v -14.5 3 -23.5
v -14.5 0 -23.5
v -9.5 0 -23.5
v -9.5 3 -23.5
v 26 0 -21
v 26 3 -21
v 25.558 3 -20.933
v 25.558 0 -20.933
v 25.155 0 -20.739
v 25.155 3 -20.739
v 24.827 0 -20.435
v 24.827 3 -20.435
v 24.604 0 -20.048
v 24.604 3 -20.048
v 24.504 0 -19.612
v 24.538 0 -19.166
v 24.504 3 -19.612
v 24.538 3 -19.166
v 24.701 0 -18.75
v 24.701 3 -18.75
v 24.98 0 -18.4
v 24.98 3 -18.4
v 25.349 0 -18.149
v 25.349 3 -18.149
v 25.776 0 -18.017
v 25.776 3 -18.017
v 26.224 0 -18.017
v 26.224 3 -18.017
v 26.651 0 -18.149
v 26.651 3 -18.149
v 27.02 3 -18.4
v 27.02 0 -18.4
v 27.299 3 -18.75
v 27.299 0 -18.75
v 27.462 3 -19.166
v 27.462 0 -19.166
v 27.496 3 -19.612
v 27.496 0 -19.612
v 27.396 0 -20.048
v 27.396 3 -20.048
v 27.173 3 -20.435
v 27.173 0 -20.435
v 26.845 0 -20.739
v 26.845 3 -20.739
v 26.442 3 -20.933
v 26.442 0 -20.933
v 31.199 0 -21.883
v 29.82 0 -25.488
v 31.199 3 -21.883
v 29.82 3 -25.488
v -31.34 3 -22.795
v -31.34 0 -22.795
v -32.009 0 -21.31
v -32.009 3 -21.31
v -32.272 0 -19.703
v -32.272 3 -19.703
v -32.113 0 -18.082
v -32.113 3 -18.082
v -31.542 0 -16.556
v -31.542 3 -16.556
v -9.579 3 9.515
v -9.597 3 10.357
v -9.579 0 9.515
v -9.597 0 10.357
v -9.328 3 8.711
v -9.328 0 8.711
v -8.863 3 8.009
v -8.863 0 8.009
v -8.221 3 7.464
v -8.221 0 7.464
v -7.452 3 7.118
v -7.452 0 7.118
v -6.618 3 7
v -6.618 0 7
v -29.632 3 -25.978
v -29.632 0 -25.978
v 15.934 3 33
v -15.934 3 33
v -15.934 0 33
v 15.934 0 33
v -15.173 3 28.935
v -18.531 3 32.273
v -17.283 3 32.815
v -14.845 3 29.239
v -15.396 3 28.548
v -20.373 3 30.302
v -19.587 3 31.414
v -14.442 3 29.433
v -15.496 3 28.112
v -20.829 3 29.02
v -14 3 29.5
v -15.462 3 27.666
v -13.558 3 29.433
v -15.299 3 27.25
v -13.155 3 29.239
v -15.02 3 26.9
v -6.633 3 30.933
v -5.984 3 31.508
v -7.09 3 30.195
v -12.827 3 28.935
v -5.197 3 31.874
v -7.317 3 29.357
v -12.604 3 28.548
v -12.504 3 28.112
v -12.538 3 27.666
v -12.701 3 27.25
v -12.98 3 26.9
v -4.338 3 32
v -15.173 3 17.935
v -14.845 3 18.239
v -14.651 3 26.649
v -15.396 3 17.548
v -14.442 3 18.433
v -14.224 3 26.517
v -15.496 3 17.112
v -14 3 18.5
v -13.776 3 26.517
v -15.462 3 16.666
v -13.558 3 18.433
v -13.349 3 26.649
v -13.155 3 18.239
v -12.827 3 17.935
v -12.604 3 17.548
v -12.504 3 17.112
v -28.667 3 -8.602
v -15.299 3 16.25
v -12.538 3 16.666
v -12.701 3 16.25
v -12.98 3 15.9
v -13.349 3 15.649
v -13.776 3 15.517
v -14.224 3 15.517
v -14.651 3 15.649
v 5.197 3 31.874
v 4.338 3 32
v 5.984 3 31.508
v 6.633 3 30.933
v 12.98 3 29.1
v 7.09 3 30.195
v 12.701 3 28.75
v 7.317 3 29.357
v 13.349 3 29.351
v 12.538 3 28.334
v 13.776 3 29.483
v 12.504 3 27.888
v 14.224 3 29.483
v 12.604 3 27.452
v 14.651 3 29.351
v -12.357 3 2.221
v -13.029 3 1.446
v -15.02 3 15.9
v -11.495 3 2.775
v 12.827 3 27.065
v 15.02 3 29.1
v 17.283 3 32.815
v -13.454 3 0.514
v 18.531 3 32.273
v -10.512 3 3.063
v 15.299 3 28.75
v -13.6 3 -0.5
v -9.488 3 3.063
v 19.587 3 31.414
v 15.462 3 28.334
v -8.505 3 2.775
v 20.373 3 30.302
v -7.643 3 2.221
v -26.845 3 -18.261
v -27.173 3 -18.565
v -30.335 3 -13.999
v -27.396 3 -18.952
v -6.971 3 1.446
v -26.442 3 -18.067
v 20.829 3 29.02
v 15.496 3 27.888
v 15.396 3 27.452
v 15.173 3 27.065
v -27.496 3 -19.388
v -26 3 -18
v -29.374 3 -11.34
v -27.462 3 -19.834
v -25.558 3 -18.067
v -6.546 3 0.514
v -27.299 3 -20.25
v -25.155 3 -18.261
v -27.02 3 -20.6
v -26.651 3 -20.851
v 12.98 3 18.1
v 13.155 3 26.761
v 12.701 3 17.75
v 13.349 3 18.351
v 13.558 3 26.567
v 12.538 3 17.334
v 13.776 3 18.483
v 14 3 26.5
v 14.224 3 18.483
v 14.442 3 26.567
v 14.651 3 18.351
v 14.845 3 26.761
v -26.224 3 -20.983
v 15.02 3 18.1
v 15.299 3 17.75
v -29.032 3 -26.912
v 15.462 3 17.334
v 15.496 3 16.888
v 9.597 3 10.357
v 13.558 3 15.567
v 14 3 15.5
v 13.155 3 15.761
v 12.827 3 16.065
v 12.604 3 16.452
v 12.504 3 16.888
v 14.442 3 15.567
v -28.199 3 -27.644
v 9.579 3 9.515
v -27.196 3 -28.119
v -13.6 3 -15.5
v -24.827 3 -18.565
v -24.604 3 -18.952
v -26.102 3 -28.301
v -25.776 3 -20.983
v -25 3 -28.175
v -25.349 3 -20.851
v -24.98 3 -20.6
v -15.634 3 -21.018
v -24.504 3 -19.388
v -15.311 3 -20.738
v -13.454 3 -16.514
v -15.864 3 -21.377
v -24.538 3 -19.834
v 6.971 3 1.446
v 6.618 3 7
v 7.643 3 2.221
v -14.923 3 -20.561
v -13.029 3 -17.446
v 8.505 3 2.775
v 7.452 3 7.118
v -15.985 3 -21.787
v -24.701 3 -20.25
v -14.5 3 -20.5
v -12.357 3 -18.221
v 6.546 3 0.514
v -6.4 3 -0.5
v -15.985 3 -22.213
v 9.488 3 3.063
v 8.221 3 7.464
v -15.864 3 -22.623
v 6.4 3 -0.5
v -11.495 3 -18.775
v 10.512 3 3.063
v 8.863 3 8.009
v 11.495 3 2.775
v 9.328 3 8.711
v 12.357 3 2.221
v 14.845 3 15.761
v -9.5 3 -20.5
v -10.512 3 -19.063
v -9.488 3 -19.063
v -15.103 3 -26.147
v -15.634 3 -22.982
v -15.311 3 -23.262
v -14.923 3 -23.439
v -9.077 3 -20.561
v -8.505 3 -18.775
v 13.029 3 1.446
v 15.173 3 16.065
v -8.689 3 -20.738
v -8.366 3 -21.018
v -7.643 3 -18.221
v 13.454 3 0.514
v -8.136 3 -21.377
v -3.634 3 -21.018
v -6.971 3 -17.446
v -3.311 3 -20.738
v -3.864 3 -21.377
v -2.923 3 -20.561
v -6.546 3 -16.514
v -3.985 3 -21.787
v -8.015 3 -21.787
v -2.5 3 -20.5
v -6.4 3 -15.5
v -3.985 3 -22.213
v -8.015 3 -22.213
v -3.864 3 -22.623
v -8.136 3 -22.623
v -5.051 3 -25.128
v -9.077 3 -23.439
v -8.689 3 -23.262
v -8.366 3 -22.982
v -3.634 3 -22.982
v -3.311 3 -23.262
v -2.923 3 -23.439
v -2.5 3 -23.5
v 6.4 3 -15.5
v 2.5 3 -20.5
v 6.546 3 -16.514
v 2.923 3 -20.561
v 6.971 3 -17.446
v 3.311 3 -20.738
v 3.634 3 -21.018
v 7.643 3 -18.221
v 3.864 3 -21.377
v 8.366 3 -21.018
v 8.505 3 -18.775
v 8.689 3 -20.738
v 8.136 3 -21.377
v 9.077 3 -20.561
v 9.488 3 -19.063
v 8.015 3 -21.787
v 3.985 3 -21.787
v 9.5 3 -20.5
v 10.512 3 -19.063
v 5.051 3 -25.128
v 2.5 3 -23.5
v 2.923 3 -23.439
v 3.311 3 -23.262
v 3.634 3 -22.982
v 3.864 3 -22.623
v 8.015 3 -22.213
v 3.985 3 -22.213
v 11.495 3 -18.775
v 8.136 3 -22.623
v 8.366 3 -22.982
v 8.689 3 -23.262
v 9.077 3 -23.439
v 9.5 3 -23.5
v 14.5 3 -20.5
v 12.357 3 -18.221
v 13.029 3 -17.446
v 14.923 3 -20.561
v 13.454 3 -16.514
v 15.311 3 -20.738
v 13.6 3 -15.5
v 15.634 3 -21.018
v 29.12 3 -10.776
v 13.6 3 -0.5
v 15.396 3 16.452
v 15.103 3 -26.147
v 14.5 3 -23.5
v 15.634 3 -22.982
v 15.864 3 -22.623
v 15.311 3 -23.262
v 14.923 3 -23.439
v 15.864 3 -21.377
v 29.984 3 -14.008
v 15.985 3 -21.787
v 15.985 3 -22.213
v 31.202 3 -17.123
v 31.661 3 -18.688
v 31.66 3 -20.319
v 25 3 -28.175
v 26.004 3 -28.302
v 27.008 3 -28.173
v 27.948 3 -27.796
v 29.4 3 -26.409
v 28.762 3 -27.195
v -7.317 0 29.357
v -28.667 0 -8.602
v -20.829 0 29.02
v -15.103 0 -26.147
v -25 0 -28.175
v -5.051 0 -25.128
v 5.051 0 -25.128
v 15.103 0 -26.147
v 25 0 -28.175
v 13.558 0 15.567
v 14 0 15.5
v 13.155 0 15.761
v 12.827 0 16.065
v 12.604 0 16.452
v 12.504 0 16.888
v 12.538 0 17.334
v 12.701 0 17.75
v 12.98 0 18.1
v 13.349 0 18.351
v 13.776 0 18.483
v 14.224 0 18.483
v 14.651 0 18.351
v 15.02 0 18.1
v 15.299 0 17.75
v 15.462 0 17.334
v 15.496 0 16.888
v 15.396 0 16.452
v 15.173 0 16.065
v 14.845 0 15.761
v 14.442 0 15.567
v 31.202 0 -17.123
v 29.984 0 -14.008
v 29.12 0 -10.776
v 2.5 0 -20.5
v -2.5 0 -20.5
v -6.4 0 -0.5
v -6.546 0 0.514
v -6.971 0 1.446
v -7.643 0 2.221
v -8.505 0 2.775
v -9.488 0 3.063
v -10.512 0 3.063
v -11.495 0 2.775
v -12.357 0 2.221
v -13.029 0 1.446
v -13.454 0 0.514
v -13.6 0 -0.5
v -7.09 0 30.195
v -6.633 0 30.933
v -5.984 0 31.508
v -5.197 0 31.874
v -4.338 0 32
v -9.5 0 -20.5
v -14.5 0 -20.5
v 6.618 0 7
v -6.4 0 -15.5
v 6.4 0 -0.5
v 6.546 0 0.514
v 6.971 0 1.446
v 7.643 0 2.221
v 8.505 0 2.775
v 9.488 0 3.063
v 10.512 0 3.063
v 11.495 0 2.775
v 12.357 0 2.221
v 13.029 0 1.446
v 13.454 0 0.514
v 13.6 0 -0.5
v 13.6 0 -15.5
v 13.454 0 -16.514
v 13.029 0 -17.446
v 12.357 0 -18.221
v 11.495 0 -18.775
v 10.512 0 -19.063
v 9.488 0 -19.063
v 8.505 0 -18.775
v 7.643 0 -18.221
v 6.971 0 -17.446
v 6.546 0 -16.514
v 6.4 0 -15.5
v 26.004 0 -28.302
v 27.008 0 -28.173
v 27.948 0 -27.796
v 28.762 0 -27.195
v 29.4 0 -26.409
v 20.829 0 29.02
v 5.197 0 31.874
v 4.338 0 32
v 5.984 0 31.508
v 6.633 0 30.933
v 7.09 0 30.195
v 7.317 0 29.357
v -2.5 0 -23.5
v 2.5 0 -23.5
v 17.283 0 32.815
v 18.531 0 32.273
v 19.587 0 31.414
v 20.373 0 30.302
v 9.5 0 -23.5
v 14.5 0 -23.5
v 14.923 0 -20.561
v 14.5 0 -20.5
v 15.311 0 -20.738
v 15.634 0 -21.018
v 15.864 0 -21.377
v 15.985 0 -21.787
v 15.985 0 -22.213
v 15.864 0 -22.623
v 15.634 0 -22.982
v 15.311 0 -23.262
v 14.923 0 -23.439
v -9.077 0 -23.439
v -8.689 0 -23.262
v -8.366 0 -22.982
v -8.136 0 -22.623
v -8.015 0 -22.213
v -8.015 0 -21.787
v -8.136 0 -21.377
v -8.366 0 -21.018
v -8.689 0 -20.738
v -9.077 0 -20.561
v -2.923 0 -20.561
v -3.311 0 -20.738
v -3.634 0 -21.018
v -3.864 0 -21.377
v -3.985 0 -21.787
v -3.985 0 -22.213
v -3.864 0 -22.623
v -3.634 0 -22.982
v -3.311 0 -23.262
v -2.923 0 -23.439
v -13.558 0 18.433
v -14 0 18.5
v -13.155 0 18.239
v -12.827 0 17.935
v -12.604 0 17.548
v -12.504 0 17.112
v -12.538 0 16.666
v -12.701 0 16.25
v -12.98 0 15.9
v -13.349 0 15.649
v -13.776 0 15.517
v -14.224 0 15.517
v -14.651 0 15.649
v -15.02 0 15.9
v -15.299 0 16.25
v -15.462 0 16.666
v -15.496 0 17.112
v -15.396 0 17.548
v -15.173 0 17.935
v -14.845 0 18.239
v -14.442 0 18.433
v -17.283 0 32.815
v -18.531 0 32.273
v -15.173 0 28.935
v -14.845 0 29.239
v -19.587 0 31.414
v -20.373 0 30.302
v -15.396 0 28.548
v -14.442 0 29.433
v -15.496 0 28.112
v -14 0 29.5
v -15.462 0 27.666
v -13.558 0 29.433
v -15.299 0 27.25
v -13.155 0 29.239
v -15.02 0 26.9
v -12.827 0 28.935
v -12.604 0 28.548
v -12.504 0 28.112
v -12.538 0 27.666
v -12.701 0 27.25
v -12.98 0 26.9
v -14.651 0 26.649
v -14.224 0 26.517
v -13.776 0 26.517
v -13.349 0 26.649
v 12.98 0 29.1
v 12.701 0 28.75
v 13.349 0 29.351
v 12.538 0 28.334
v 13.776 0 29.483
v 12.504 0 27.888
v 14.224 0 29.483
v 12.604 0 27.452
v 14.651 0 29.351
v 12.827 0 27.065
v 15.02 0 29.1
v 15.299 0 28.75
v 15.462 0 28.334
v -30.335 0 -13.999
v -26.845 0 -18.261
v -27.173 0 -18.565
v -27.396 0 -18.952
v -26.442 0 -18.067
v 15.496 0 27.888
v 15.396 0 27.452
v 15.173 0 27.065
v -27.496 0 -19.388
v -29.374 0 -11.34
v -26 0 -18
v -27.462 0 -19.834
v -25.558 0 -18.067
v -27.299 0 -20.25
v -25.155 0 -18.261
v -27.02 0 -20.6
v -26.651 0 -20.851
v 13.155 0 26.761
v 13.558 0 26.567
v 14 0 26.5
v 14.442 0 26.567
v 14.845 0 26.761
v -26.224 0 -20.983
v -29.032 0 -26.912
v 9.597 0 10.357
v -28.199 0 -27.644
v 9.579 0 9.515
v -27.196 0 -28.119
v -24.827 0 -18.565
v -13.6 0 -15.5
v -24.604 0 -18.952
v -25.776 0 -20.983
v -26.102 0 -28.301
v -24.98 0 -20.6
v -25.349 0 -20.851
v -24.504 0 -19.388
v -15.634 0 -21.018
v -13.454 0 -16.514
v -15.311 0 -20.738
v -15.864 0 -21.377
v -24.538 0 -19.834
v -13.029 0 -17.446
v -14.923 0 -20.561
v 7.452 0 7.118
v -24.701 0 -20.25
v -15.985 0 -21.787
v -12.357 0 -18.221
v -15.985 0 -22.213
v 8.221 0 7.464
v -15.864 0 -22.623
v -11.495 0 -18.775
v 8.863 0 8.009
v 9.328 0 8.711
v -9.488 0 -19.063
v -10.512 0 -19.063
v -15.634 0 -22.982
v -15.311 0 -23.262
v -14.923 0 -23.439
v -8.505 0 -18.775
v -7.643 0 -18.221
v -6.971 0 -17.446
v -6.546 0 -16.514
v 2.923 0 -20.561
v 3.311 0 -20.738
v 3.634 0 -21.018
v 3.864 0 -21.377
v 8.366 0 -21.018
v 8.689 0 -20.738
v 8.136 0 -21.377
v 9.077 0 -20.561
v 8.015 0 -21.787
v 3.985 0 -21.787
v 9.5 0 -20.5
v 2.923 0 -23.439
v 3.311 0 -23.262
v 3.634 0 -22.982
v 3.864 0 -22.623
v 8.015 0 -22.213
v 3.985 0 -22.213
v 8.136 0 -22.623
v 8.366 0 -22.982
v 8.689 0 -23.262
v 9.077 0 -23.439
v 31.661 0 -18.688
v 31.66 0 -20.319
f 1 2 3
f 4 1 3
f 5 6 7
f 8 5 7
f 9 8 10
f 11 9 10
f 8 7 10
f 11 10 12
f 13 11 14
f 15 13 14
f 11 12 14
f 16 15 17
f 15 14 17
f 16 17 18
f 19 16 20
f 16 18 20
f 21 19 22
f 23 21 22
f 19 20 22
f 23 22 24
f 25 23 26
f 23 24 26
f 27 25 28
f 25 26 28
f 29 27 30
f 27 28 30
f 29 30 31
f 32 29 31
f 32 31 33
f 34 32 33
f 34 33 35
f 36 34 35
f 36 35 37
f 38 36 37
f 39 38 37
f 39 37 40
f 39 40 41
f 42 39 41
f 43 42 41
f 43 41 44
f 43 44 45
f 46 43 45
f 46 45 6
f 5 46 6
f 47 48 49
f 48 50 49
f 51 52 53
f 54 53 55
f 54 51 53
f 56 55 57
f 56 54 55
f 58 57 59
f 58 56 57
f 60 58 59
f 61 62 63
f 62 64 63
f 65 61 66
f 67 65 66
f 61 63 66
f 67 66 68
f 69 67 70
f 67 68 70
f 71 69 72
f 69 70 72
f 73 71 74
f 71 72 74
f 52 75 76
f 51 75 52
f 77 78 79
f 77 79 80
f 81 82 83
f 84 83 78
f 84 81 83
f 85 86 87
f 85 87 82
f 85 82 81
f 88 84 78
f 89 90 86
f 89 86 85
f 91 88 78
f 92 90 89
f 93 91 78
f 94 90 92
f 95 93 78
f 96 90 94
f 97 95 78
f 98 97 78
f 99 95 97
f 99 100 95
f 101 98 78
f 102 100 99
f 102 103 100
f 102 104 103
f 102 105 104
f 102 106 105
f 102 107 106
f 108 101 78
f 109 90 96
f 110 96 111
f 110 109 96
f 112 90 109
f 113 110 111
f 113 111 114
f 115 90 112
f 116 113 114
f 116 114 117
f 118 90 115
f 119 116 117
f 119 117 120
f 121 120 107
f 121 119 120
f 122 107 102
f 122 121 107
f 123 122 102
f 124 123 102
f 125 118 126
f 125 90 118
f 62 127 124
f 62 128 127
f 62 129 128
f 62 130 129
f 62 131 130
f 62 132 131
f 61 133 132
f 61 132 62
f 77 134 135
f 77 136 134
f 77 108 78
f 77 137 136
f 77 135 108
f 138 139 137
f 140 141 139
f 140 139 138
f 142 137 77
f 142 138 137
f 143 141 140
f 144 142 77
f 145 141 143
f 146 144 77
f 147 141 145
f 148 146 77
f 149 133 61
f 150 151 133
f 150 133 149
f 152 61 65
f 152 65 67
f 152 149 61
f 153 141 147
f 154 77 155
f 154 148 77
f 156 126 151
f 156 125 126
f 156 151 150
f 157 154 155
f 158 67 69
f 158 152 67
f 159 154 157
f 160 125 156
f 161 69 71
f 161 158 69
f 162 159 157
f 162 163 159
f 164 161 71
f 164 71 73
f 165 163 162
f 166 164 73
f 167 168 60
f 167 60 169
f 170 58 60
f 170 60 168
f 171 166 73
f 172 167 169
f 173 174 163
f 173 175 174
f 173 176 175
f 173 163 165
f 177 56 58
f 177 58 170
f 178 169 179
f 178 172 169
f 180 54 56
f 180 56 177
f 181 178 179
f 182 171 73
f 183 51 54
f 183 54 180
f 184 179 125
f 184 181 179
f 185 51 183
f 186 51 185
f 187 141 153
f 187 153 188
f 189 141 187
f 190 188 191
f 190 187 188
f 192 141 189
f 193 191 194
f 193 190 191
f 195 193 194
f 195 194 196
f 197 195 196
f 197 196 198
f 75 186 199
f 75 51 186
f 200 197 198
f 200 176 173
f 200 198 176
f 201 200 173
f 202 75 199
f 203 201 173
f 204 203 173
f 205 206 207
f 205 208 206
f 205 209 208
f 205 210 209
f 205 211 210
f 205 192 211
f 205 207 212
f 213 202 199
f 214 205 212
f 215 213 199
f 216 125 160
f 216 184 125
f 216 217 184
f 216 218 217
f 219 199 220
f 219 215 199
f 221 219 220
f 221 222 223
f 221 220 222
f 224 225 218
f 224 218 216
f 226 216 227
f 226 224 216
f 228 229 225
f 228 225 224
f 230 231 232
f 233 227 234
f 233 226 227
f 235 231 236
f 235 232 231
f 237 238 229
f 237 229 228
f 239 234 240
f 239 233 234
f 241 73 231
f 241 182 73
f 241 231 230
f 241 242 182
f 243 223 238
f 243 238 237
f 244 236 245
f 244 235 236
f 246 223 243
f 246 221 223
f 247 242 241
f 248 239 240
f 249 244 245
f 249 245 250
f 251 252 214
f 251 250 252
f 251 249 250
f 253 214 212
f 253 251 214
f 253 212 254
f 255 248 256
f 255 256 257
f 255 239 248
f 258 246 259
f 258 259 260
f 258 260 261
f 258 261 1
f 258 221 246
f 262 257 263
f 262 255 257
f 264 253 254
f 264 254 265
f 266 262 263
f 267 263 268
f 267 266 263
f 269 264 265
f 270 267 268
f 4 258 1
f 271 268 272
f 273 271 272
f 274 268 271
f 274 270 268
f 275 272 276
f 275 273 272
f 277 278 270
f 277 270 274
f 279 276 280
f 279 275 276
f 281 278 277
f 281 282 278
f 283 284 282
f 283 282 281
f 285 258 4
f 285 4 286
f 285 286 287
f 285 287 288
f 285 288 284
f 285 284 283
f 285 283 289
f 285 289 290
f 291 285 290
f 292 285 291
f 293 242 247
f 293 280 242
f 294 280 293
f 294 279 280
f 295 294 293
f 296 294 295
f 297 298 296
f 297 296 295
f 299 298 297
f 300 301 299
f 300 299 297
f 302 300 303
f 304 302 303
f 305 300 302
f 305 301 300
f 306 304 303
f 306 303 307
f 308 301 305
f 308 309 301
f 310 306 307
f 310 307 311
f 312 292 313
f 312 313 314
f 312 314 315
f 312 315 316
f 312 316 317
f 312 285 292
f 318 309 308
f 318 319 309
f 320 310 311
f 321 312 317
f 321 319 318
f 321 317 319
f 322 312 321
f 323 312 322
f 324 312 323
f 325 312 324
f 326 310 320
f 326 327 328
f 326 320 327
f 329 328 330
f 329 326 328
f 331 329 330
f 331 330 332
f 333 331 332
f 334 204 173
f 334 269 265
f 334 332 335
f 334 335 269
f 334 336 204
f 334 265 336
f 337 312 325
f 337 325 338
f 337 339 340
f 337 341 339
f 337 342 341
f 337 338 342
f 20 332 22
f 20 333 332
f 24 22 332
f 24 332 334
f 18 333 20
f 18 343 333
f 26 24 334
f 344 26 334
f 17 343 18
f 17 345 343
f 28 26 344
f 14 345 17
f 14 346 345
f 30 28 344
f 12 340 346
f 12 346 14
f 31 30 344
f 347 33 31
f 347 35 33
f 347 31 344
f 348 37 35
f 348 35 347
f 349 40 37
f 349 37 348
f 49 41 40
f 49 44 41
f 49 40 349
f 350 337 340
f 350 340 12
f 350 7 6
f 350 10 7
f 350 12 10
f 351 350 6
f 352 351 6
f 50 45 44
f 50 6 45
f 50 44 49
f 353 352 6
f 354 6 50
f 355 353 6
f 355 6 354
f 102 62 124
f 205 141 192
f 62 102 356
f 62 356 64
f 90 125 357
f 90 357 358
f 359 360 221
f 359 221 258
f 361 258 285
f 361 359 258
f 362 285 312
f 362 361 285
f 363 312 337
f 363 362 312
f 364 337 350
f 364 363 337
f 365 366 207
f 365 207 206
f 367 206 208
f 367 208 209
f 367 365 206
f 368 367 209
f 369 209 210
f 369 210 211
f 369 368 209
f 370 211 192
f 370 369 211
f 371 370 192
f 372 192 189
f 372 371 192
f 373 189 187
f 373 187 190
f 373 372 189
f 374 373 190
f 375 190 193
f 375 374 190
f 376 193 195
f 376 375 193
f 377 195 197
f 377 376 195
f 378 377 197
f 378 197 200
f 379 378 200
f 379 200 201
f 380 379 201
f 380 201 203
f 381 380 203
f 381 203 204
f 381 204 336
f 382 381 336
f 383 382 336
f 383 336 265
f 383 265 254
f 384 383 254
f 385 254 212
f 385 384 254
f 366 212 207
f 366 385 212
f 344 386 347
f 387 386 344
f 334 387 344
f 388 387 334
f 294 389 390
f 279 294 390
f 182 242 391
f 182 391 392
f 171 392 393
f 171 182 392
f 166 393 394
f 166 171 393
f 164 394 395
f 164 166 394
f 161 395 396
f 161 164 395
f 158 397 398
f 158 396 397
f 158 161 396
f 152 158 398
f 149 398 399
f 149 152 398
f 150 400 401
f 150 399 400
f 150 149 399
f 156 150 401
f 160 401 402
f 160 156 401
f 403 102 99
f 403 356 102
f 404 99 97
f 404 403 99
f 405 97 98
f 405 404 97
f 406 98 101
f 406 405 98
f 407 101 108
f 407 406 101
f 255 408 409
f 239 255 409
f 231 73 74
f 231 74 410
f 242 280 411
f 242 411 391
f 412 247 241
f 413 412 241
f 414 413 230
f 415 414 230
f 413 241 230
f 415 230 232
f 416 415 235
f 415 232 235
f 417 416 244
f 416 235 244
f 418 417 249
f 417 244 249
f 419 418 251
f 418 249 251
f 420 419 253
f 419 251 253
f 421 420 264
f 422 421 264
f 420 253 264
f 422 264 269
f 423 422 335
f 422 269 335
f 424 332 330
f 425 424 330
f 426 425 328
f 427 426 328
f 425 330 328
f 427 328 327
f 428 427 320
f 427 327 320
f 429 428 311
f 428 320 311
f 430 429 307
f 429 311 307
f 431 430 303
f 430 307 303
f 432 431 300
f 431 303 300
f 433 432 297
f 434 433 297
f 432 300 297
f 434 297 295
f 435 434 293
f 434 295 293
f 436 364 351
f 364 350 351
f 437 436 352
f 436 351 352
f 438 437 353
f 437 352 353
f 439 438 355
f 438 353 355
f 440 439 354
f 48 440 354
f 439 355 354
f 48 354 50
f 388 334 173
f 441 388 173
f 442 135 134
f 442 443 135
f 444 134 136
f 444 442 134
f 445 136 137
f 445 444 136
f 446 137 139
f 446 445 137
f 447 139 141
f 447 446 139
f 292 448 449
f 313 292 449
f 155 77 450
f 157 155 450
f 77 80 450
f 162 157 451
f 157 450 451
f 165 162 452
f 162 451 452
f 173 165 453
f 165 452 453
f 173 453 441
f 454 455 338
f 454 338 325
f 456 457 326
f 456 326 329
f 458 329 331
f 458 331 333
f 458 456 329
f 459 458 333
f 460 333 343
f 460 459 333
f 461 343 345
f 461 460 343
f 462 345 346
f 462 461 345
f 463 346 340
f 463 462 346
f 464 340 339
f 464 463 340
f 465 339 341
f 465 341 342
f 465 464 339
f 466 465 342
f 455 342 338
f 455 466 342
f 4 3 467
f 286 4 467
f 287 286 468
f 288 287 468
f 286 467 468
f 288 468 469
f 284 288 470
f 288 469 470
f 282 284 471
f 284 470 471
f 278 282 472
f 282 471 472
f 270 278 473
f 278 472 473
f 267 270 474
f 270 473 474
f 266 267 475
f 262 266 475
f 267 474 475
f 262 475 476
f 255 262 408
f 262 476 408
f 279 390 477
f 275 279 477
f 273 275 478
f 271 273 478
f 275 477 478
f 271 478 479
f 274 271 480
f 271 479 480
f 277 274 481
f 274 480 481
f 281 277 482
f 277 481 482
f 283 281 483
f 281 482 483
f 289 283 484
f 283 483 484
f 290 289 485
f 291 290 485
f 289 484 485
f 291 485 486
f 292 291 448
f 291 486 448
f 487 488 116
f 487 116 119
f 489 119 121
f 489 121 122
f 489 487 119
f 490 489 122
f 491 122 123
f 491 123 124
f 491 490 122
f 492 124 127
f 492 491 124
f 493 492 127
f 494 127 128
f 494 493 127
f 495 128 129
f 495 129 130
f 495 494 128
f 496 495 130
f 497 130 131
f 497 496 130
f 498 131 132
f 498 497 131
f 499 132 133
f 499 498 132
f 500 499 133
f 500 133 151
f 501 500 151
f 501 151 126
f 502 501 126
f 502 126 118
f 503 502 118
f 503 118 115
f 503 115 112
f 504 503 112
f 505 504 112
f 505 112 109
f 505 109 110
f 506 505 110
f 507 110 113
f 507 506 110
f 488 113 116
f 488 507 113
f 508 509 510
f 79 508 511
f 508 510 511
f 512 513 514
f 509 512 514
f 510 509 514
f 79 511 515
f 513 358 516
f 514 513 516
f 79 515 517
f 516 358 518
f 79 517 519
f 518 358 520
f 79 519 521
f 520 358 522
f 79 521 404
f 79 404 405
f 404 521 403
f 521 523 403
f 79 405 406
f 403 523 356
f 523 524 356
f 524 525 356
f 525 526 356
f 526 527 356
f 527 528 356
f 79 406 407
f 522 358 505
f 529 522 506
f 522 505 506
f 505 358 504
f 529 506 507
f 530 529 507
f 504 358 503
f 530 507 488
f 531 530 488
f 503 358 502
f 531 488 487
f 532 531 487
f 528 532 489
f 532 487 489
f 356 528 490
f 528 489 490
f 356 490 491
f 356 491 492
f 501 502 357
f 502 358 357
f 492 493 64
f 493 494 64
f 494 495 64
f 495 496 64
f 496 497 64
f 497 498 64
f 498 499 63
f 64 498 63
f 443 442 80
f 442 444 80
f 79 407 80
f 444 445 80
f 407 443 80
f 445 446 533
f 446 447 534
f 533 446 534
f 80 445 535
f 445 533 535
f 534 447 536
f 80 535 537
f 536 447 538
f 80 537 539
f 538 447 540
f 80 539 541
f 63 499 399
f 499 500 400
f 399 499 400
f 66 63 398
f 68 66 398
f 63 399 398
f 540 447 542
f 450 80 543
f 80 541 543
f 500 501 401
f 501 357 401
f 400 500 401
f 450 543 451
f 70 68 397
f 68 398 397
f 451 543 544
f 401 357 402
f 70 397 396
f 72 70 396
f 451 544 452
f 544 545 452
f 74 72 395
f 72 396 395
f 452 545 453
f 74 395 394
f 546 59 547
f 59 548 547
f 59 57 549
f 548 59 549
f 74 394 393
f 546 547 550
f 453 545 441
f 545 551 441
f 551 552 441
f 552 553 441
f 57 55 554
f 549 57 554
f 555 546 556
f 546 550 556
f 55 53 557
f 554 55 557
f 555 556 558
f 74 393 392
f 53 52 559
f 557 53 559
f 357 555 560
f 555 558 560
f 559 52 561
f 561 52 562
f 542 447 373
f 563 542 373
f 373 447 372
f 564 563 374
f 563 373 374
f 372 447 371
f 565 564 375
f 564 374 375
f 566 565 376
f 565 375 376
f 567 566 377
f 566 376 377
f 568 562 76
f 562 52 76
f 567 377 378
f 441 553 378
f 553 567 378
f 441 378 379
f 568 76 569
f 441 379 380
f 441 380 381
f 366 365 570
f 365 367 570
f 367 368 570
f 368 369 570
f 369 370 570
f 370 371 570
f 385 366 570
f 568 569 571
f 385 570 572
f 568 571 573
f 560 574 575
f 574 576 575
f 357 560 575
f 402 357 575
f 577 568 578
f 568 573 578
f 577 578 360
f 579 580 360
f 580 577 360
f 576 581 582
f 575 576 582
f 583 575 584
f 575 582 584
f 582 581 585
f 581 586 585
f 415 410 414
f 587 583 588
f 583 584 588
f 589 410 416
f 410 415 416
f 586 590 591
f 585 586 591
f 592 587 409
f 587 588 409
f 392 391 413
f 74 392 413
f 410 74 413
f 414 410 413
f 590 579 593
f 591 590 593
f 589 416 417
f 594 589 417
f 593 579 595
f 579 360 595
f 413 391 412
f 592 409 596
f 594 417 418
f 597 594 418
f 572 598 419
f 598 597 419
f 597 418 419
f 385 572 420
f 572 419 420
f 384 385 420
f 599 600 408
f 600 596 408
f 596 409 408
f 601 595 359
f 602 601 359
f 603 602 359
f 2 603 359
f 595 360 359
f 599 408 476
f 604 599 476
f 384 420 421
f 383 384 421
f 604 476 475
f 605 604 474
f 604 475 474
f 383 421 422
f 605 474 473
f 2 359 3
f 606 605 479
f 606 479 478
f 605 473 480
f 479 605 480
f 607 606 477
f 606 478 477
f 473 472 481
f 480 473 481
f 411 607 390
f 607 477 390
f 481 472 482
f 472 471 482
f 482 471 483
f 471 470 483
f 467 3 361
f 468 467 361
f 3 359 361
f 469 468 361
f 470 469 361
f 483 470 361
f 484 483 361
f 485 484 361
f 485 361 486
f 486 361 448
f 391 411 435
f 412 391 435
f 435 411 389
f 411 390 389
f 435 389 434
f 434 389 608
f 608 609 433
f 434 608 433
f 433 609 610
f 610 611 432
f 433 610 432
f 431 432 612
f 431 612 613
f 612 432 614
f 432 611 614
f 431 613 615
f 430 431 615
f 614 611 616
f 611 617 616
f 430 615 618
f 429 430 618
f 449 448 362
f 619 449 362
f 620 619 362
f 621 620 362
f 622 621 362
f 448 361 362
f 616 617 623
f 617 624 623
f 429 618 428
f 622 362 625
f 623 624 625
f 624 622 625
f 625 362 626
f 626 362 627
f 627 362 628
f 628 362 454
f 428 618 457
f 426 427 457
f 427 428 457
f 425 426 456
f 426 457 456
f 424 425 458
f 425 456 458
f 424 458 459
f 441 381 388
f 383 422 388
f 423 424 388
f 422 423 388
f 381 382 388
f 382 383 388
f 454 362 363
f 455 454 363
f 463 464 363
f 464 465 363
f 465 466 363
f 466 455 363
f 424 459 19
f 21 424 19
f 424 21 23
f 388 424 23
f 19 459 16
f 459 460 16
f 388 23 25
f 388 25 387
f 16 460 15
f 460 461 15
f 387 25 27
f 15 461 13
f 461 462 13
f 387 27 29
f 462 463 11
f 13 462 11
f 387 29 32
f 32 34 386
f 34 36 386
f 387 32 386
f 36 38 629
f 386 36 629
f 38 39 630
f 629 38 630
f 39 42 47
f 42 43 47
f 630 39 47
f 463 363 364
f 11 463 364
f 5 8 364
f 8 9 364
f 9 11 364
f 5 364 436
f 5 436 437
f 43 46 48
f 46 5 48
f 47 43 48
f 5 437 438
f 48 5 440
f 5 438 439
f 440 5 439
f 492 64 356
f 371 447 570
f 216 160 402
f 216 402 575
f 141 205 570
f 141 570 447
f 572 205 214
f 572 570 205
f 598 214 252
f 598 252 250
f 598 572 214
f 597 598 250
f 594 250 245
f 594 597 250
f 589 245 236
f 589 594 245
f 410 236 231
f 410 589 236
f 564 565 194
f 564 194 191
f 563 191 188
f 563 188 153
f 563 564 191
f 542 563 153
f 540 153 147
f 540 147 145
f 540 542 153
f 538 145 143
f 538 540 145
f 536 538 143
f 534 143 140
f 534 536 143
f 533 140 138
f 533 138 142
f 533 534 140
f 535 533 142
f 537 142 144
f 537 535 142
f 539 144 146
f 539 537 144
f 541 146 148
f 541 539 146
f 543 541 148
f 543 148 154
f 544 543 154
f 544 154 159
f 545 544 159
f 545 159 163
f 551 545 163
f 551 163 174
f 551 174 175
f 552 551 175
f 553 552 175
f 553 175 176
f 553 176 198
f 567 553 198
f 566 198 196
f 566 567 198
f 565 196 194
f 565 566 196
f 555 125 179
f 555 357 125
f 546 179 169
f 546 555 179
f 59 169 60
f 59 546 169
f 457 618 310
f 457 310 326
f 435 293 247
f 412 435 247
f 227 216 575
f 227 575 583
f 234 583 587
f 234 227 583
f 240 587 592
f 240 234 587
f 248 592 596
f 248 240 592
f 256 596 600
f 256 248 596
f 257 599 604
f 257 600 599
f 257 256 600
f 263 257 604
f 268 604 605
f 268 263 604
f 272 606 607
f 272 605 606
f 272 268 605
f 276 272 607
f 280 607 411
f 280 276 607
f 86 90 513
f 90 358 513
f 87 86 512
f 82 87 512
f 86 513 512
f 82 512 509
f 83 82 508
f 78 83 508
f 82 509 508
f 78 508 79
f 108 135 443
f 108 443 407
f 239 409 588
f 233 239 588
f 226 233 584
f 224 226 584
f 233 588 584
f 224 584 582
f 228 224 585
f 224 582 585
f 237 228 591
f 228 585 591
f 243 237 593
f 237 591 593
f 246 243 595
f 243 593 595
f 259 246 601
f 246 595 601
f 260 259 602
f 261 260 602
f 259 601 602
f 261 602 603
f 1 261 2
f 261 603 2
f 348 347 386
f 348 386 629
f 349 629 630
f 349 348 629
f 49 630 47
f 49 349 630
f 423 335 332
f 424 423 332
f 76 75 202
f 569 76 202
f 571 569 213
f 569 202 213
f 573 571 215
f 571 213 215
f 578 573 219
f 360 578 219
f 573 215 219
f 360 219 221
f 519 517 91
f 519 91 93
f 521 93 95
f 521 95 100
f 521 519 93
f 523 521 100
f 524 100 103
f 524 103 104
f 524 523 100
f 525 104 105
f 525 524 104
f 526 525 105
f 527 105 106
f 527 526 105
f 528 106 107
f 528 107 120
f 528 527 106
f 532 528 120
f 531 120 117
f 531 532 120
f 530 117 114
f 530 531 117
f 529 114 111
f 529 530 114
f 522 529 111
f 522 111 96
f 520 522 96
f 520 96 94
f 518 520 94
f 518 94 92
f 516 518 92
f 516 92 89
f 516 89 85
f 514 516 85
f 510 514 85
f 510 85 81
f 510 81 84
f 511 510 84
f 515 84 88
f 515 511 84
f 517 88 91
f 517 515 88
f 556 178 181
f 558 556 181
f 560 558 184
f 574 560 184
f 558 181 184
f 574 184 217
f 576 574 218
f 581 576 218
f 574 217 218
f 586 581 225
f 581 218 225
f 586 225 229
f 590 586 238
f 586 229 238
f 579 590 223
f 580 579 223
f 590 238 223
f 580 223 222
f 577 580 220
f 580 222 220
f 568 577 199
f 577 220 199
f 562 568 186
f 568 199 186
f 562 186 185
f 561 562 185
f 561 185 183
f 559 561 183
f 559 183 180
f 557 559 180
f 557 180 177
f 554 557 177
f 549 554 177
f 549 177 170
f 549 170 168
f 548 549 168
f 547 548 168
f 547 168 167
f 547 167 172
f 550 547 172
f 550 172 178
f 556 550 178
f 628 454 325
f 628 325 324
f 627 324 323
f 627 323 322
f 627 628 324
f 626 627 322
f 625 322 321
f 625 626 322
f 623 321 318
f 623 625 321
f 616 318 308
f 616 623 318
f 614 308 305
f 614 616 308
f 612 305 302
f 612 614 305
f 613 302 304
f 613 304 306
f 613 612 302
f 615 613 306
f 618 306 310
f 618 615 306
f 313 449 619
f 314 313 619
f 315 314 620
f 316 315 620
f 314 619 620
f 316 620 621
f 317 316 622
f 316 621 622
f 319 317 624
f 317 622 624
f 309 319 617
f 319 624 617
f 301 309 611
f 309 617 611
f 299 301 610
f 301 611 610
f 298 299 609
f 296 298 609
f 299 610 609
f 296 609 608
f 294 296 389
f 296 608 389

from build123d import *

# Parameters (mm, degrees)
SKETCH_1_R          = 1.5
EXTRUDE_1_DEPTH     = 3
SKETCH_2_R          = 1.5
CUT_EXTRUDE_1_DEPTH = 55.166410256
EXTRUDE_2_DEPTH     = 3
CUT_EXTRUDE_2_DEPTH = 55.166410256
CUT_EXTRUDE_3_DEPTH = 3
FILLET_1_R          = 3
EXTRUDE_3_DEPTH     = 3
FILLET_3_R          = 4
SKETCH_9_W          = 40
SKETCH_9_H          = 28
CUT_EXTRUDE_4_DEPTH = 10
FILLET_4_R          = 5
SKETCH_11_R         = 6.275308726
SKETCH_11_R_2       = 1.5
SKETCH_11_R_3       = 5.719245844
EXTRUDE_4_DEPTH     = 3
FILLET_5_R          = 30


with BuildPart() as part:
    # 草图1 → 凸台-拉伸1 (new body)
    with BuildSketch(Plane(origin=(0, 0, 0), x_dir=(1, 0, 0), z_dir=(0, 1, 0))):
        with BuildLine():
            Line((-17.5, -25), (-30, -25))
            Line((-30, -25), (-30, 25))
            Line((-30, 25), (-30, 29.606079858))
            ThreePointArc((-30, 29.606079858), (0, 25), (30, 29.606079858))
            Line((30, 29.606079858), (30, 25))
            Line((30, 25), (30, -25))
            Line((30, -25), (17.5, -25))
            Line((17.5, -25), (17.5, -45))
            Line((17.5, -45), (-17.5, -45))
            Line((-17.5, -45), (-17.5, -25))
        make_face()
        with Locations(Location((-14, -17, 0), (0, 0, 270))):
            Circle(SKETCH_1_R, mode=Mode.SUBTRACT)
        with Locations(Location((14, -17, 0), (0, 0, 90))):
            Circle(SKETCH_1_R, mode=Mode.SUBTRACT)
        with Locations(Location((-14, -28, 0), (0, 0, 270))):
            Circle(SKETCH_1_R, mode=Mode.SUBTRACT)
        with Locations(Location((14, -28, 0), (0, 0, 90))):
            Circle(SKETCH_1_R, mode=Mode.SUBTRACT)
        with BuildLine():
            Line((9.5, 20.5), (14.5, 20.5))
            ThreePointArc((14.5, 20.5), (16, 22), (14.5, 23.5))
            Line((14.5, 23.5), (9.5, 23.5))
            ThreePointArc((9.5, 23.5), (8, 22), (9.5, 20.5))
        make_face(mode=Mode.SUBTRACT)
        with BuildLine():
            Line((-2.5, 23.5), (2.5, 23.5))
            ThreePointArc((2.5, 23.5), (4, 22), (2.5, 20.5))
            Line((2.5, 20.5), (-2.5, 20.5))
            ThreePointArc((-2.5, 20.5), (-4, 22), (-2.5, 23.5))
        make_face(mode=Mode.SUBTRACT)
        with BuildLine():
            Line((-14.5, 23.5), (-9.5, 23.5))
            ThreePointArc((-9.5, 23.5), (-8, 22), (-9.5, 20.5))
            Line((-9.5, 20.5), (-14.5, 20.5))
            ThreePointArc((-14.5, 20.5), (-16, 22), (-14.5, 23.5))
        make_face(mode=Mode.SUBTRACT)
    extrude(amount=EXTRUDE_1_DEPTH)

    # 草图2 → 切除-拉伸1 (cut, through all)
    with BuildSketch(Plane(origin=(0, 3, 0), x_dir=(1, 0, 0), z_dir=(0, 1, 0))):
        with Locations(Location((-26, 19.5, 0), (0, 0, 270))):
            Circle(SKETCH_2_R)
        with Locations(Location((26, 19.5, 0), (0, 0, 90))):
            Circle(SKETCH_2_R)
        with BuildLine():
            Line((-6.4, 15.5), (-6.4, 0.5))
            ThreePointArc((-6.4, 0.5), (-10, -3.1), (-13.6, 0.5))
            Line((-13.6, 0.5), (-13.6, 15.5))
            ThreePointArc((-13.6, 15.5), (-10, 19.1), (-6.4, 15.5))
        make_face()
        with BuildLine():
            Line((6.4, 15.5), (6.4, 0.5))
            ThreePointArc((6.4, 0.5), (10, -3.1), (13.6, 0.5))
            Line((13.6, 0.5), (13.6, 15.5))
            ThreePointArc((13.6, 15.5), (10, 19.1), (6.4, 15.5))
        make_face()
    extrude(amount=-CUT_EXTRUDE_1_DEPTH, mode=Mode.SUBTRACT)

    # 草图3 → 凸台-拉伸2 (add)
    with BuildSketch(Plane(origin=(0, 3, 0), x_dir=(1, 0, 0), z_dir=(0, 1, 0))):
        Polygon((-30, -25), (-17.5, -45), (-17.5, -25), align=None)
        Polygon((17.5, -25), (17.5, -45), (30, -25), align=None)
    extrude(amount=-EXTRUDE_2_DEPTH)

    # 草图4 → 切除-拉伸2 (cut, through all)
    with BuildSketch(Plane(origin=(0, 3, 0), x_dir=(1, 0, 0), z_dir=(0, 1, 0))):
        Polygon((-30, 15), (-17.5, -45), (-30, -25), align=None)
        Polygon((17.5, -45), (30, -25), (30, 15), align=None)
    extrude(amount=-CUT_EXTRUDE_2_DEPTH, mode=Mode.SUBTRACT)

    # 草图6 → 切除-拉伸3 (cut)
    with BuildSketch(Plane(origin=(0, 3, 0), x_dir=(1, 0, 0), z_dir=(0, 1, 0))):
        Polygon((-10, -7), (10, -7), (7, -32), (-7, -32), align=None)
    extrude(amount=-CUT_EXTRUDE_3_DEPTH, mode=Mode.SUBTRACT)

    # 圆角1
    fillet_1_edges = [part.edges().sort_by_distance(p)[0] for p in [
        (10, 1.5, 7),
        (7, 1.5, 32),
        (-7, 1.5, 32),
        (-10, 1.5, 7),
    ]]
    fillet(fillet_1_edges, radius=FILLET_1_R)

    # 草图8 → 凸台-拉伸3 (add)
    with BuildSketch(Plane(origin=(0, 3, 0), x_dir=(1, 0, 0), z_dir=(0, 1, 0))):
        Polygon((-17.5, -45), (-17.083333333, -47), (17.083333333, -47), (17.5, -45), align=None)
    extrude(amount=-EXTRUDE_3_DEPTH)

    # 圆角3
    fillet_3_edges = [part.edges().sort_by_distance(p)[0] for p in [
        (-30, 1.5, -15),
        (30, 1.5, -15),
        (-30, 1.5, -29.606079858),
        (30, 1.5, -29.606079858),
        (17.083333333, 1.5, 47),
        (-17.083333333, 1.5, 47),
    ]]
    fillet(fillet_3_edges, radius=FILLET_3_R)

    # 草图9 → 切除-拉伸4 (cut)
    with BuildSketch(Plane(origin=(0, 3, 0), x_dir=(1, 0, 0), z_dir=(0, 1, 0))):
        with Locations((0, -47)):
            Rectangle(SKETCH_9_W, SKETCH_9_H)
    extrude(amount=-CUT_EXTRUDE_4_DEPTH, mode=Mode.SUBTRACT)

    # 圆角4
    fillet_4_edges = [part.edges().sort_by_distance(p)[0] for p in [
        (-20, 1.5, 33),
        (20, 1.5, 33),
    ]]
    fillet(fillet_4_edges, radius=FILLET_4_R)

    # 草图11 → 凸台-拉伸4 (add)
    # profile 1 of 2: a face of its own
    with BuildSketch(Plane(origin=(0, 3, 0), x_dir=(1, 0, 0), z_dir=(0, 1, 0))):
        with Locations((-26, 19.5)):
            Circle(SKETCH_11_R)
        with Locations(Location((-26, 19.5, 0), (0, 0, 270))):
            Circle(SKETCH_11_R_2, mode=Mode.SUBTRACT)
    # profile 2 of 2: a face of its own
    with BuildSketch(Plane(origin=(0, 3, 0), x_dir=(1, 0, 0), z_dir=(0, 1, 0))):
        with Locations((26, 19.5)):
            Circle(SKETCH_11_R_3)
        with Locations(Location((26, 19.5, 0), (0, 0, 90))):
            Circle(SKETCH_11_R_2, mode=Mode.SUBTRACT)
    extrude(amount=-EXTRUDE_4_DEPTH)

    # 圆角5
    fillet_5_edges = [part.edges().sort_by_distance(p)[0] for p in [
        (30, 1.5, -15.412241075),
        (30, 1.5, -23.587758925),
        (-29.915921679, 1.5, -14.596424059),
        (-29.999864579, 1.5, -24.335347242),
    ]]
    fillet(fillet_5_edges, radius=FILLET_5_R)


solid = part.part
